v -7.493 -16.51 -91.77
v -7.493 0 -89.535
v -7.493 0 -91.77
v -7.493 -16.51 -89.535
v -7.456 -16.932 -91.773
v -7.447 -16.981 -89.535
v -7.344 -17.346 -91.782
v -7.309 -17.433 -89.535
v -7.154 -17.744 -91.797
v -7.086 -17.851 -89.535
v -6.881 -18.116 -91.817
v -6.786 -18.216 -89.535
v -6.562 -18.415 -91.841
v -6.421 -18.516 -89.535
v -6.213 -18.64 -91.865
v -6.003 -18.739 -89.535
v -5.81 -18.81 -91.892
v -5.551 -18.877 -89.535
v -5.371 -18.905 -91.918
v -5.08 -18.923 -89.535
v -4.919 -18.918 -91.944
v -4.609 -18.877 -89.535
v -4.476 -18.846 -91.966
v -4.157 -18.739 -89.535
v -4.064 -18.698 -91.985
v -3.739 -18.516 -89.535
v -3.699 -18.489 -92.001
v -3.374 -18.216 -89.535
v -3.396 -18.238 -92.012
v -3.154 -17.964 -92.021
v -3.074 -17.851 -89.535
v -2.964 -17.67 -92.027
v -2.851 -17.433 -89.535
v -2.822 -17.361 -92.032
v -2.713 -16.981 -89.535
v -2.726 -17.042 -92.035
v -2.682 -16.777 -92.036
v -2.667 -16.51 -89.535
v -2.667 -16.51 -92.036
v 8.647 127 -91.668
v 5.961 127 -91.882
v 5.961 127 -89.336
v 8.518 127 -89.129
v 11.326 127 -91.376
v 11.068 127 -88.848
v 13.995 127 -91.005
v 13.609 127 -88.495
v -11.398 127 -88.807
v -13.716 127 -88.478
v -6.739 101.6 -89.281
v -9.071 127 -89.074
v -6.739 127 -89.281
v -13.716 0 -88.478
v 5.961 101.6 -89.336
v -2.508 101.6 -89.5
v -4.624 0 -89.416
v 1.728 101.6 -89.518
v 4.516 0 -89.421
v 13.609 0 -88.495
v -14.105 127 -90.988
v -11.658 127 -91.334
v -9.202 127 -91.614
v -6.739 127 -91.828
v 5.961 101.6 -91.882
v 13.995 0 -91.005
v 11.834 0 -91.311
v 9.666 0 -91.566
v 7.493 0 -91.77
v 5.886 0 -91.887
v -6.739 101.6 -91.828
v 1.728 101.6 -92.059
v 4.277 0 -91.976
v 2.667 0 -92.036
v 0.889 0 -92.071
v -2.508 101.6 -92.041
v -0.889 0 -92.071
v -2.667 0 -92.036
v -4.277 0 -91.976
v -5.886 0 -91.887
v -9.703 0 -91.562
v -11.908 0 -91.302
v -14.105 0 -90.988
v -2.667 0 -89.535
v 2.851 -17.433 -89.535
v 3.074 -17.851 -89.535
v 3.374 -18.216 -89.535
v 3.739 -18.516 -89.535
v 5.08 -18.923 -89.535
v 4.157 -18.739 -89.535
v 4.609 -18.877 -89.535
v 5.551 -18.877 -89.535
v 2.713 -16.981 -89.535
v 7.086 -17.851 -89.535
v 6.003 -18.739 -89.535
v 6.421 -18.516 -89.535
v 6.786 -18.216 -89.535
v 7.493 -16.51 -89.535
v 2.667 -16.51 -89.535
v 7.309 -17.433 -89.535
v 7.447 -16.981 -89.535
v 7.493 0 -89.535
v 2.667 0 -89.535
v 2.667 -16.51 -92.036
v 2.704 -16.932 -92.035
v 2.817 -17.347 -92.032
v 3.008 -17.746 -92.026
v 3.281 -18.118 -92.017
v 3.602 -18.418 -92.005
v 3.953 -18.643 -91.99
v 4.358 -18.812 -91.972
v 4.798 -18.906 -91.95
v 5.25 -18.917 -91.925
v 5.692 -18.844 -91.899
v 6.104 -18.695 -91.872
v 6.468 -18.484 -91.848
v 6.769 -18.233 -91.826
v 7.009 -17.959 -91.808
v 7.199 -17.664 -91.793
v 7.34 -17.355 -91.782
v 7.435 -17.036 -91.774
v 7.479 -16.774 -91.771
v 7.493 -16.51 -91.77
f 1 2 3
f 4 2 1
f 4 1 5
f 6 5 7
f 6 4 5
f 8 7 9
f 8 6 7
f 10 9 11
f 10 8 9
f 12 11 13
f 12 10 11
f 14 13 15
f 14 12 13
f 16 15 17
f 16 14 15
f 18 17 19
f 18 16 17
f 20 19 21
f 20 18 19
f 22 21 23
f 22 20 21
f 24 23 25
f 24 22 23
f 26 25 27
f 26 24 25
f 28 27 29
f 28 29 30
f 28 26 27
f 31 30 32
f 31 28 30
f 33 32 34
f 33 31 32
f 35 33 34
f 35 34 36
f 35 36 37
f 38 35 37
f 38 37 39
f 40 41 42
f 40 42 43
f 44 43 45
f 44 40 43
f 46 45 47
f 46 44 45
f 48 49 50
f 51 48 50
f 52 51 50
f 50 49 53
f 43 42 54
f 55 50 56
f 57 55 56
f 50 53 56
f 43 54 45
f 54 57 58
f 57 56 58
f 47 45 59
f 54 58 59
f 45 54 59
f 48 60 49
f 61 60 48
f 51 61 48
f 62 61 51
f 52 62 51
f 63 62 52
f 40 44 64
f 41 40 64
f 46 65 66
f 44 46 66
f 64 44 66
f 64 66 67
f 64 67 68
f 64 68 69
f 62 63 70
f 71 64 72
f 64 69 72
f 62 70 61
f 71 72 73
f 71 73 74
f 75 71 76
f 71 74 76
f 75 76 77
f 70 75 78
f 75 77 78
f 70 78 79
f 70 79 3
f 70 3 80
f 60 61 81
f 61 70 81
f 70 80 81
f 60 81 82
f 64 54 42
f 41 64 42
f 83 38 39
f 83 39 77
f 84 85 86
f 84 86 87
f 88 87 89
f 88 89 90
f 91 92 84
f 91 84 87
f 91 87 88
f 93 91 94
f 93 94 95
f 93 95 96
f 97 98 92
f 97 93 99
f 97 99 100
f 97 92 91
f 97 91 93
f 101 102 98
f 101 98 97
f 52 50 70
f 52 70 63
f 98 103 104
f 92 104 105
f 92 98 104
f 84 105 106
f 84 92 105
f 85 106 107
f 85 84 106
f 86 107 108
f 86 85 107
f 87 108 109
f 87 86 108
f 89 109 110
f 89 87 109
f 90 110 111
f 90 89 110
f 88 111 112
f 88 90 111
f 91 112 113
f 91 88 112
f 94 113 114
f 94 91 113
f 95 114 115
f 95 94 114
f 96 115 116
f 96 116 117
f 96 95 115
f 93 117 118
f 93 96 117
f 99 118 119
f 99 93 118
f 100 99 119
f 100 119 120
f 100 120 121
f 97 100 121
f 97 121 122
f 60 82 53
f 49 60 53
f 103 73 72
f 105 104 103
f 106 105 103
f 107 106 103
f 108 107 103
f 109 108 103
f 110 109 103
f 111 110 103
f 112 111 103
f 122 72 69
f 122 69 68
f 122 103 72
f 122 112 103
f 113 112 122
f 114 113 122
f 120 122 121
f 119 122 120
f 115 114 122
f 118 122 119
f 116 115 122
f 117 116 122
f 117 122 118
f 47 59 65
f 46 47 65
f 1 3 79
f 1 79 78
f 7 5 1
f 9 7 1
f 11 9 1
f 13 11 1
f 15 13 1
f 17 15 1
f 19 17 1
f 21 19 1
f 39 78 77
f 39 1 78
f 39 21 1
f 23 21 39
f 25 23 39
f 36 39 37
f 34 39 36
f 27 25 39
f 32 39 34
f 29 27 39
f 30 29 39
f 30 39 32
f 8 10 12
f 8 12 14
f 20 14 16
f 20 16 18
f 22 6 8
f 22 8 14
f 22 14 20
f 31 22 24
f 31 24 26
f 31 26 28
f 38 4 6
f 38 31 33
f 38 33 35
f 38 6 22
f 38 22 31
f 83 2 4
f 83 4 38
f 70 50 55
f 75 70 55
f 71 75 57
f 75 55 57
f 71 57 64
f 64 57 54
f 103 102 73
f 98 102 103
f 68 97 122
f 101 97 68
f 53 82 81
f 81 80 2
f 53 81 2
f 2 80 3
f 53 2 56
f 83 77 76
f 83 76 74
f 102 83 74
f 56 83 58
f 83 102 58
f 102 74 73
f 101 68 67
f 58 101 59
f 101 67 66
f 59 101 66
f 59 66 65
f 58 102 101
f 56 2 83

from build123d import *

# Parameters (mm, degrees)
BOSS_EXTRUDE1_DEPTH      = 127
BOSS_EXTRUDE5_REACH      = 249.033
BOSS_EXTRUDE5_END_RADIUS = 92.075
BOSS_EXTRUDE5_START      = -89.535
CUT_EXTRUDE4_REACH       = 159.498
CUT_EXTRUDE4_END_RADIUS  = 92.075
SKETCH9_W                = 12.7
SKETCH9_H                = 25.4


with BuildPart() as part:
    # Sketch1 → Boss-Extrude1 (new body)
    with BuildSketch(Plane(origin=(0, 0, 0), x_dir=(1, 0, 0), z_dir=(0, 1, 0))):
        with BuildLine():
            Line((-14.105106383, 90.988194833), (-13.716, 88.478175665))
            ThreePointArc((-13.716, 88.478175665), (-0.054221583, 89.534983582), (13.608826801, 88.494723335))
            Line((13.608826801, 88.494723335), (13.994892809, 91.00521194))
            ThreePointArc((13.994892809, 91.00521194), (-0.055759783, 92.074983116), (-14.105106383, 90.988194833))
        make_face()
    extrude(amount=BOSS_EXTRUDE1_DEPTH)

    # Boss-Extrude5: up to this cylinder (the profile starts inside it)
    boss_extrude5_end = Plane(origin=(0, -9.210463, 0), z_dir=(0, -1, 0)) * Cylinder(BOSS_EXTRUDE5_END_RADIUS, 683.216, mode=Mode.PRIVATE)
    # Sketch7 → Boss-Extrude5 (add, up to the surface)
    with BuildSketch(Plane.XY.offset(BOSS_EXTRUDE5_START), mode=Mode.PRIVATE) as boss_extrude5_sk1:
        with BuildLine():
            Line((-2.667, -16.51), (-2.667, 0))
            Line((-2.667, 0), (-7.493, 0))
            Line((-7.493, 0), (-7.493, -16.51))
            ThreePointArc((-7.493, -16.51), (-5.08, -18.923), (-2.667, -16.51))
        make_face()
    boss_extrude5_tool1 = extrude(boss_extrude5_sk1.sketch, amount=-BOSS_EXTRUDE5_REACH, mode=Mode.PRIVATE) & boss_extrude5_end
    add(boss_extrude5_tool1.solids().sort_by_distance((-5.08, -9.210463, -89.535))[0])
    # Sketch7 → Boss-Extrude5 (add, up to the surface)
    with BuildSketch(Plane.XY.offset(BOSS_EXTRUDE5_START), mode=Mode.PRIVATE) as boss_extrude5_sk2:
        with BuildLine():
            Line((2.667, 0), (2.667, -16.51))
            ThreePointArc((2.667, -16.51), (5.08, -18.923), (7.493, -16.51))
            Line((7.493, -16.51), (7.493, 0))
            Line((7.493, 0), (2.667, 0))
        make_face()
    boss_extrude5_tool2 = extrude(boss_extrude5_sk2.sketch, amount=-BOSS_EXTRUDE5_REACH, mode=Mode.PRIVATE) & boss_extrude5_end
    add(boss_extrude5_tool2.solids().sort_by_distance((5.08, -9.210463, -89.535))[0])

    # Cut-Extrude4: up to this cylinder (the profile starts inside it)
    cut_extrude4_end = Plane(origin=(0, 114.3, 0), z_dir=(0, -1, 0)) * Cylinder(CUT_EXTRUDE4_END_RADIUS, 504.146, mode=Mode.PRIVATE)
    # Sketch9 → Cut-Extrude4 (cut, up to the surface)
    with BuildSketch(Plane.XY, mode=Mode.PRIVATE) as cut_extrude4_sk1:
        with Locations((-0.389106383, 114.3)):
            Rectangle(SKETCH9_W, SKETCH9_H)
    cut_extrude4_tool1 = extrude(cut_extrude4_sk1.sketch, amount=-CUT_EXTRUDE4_REACH, mode=Mode.PRIVATE) & cut_extrude4_end
    add(cut_extrude4_tool1.solids().sort_by_distance((-0.389106, 114.3, 0))[0], mode=Mode.SUBTRACT)


solid = part.part
